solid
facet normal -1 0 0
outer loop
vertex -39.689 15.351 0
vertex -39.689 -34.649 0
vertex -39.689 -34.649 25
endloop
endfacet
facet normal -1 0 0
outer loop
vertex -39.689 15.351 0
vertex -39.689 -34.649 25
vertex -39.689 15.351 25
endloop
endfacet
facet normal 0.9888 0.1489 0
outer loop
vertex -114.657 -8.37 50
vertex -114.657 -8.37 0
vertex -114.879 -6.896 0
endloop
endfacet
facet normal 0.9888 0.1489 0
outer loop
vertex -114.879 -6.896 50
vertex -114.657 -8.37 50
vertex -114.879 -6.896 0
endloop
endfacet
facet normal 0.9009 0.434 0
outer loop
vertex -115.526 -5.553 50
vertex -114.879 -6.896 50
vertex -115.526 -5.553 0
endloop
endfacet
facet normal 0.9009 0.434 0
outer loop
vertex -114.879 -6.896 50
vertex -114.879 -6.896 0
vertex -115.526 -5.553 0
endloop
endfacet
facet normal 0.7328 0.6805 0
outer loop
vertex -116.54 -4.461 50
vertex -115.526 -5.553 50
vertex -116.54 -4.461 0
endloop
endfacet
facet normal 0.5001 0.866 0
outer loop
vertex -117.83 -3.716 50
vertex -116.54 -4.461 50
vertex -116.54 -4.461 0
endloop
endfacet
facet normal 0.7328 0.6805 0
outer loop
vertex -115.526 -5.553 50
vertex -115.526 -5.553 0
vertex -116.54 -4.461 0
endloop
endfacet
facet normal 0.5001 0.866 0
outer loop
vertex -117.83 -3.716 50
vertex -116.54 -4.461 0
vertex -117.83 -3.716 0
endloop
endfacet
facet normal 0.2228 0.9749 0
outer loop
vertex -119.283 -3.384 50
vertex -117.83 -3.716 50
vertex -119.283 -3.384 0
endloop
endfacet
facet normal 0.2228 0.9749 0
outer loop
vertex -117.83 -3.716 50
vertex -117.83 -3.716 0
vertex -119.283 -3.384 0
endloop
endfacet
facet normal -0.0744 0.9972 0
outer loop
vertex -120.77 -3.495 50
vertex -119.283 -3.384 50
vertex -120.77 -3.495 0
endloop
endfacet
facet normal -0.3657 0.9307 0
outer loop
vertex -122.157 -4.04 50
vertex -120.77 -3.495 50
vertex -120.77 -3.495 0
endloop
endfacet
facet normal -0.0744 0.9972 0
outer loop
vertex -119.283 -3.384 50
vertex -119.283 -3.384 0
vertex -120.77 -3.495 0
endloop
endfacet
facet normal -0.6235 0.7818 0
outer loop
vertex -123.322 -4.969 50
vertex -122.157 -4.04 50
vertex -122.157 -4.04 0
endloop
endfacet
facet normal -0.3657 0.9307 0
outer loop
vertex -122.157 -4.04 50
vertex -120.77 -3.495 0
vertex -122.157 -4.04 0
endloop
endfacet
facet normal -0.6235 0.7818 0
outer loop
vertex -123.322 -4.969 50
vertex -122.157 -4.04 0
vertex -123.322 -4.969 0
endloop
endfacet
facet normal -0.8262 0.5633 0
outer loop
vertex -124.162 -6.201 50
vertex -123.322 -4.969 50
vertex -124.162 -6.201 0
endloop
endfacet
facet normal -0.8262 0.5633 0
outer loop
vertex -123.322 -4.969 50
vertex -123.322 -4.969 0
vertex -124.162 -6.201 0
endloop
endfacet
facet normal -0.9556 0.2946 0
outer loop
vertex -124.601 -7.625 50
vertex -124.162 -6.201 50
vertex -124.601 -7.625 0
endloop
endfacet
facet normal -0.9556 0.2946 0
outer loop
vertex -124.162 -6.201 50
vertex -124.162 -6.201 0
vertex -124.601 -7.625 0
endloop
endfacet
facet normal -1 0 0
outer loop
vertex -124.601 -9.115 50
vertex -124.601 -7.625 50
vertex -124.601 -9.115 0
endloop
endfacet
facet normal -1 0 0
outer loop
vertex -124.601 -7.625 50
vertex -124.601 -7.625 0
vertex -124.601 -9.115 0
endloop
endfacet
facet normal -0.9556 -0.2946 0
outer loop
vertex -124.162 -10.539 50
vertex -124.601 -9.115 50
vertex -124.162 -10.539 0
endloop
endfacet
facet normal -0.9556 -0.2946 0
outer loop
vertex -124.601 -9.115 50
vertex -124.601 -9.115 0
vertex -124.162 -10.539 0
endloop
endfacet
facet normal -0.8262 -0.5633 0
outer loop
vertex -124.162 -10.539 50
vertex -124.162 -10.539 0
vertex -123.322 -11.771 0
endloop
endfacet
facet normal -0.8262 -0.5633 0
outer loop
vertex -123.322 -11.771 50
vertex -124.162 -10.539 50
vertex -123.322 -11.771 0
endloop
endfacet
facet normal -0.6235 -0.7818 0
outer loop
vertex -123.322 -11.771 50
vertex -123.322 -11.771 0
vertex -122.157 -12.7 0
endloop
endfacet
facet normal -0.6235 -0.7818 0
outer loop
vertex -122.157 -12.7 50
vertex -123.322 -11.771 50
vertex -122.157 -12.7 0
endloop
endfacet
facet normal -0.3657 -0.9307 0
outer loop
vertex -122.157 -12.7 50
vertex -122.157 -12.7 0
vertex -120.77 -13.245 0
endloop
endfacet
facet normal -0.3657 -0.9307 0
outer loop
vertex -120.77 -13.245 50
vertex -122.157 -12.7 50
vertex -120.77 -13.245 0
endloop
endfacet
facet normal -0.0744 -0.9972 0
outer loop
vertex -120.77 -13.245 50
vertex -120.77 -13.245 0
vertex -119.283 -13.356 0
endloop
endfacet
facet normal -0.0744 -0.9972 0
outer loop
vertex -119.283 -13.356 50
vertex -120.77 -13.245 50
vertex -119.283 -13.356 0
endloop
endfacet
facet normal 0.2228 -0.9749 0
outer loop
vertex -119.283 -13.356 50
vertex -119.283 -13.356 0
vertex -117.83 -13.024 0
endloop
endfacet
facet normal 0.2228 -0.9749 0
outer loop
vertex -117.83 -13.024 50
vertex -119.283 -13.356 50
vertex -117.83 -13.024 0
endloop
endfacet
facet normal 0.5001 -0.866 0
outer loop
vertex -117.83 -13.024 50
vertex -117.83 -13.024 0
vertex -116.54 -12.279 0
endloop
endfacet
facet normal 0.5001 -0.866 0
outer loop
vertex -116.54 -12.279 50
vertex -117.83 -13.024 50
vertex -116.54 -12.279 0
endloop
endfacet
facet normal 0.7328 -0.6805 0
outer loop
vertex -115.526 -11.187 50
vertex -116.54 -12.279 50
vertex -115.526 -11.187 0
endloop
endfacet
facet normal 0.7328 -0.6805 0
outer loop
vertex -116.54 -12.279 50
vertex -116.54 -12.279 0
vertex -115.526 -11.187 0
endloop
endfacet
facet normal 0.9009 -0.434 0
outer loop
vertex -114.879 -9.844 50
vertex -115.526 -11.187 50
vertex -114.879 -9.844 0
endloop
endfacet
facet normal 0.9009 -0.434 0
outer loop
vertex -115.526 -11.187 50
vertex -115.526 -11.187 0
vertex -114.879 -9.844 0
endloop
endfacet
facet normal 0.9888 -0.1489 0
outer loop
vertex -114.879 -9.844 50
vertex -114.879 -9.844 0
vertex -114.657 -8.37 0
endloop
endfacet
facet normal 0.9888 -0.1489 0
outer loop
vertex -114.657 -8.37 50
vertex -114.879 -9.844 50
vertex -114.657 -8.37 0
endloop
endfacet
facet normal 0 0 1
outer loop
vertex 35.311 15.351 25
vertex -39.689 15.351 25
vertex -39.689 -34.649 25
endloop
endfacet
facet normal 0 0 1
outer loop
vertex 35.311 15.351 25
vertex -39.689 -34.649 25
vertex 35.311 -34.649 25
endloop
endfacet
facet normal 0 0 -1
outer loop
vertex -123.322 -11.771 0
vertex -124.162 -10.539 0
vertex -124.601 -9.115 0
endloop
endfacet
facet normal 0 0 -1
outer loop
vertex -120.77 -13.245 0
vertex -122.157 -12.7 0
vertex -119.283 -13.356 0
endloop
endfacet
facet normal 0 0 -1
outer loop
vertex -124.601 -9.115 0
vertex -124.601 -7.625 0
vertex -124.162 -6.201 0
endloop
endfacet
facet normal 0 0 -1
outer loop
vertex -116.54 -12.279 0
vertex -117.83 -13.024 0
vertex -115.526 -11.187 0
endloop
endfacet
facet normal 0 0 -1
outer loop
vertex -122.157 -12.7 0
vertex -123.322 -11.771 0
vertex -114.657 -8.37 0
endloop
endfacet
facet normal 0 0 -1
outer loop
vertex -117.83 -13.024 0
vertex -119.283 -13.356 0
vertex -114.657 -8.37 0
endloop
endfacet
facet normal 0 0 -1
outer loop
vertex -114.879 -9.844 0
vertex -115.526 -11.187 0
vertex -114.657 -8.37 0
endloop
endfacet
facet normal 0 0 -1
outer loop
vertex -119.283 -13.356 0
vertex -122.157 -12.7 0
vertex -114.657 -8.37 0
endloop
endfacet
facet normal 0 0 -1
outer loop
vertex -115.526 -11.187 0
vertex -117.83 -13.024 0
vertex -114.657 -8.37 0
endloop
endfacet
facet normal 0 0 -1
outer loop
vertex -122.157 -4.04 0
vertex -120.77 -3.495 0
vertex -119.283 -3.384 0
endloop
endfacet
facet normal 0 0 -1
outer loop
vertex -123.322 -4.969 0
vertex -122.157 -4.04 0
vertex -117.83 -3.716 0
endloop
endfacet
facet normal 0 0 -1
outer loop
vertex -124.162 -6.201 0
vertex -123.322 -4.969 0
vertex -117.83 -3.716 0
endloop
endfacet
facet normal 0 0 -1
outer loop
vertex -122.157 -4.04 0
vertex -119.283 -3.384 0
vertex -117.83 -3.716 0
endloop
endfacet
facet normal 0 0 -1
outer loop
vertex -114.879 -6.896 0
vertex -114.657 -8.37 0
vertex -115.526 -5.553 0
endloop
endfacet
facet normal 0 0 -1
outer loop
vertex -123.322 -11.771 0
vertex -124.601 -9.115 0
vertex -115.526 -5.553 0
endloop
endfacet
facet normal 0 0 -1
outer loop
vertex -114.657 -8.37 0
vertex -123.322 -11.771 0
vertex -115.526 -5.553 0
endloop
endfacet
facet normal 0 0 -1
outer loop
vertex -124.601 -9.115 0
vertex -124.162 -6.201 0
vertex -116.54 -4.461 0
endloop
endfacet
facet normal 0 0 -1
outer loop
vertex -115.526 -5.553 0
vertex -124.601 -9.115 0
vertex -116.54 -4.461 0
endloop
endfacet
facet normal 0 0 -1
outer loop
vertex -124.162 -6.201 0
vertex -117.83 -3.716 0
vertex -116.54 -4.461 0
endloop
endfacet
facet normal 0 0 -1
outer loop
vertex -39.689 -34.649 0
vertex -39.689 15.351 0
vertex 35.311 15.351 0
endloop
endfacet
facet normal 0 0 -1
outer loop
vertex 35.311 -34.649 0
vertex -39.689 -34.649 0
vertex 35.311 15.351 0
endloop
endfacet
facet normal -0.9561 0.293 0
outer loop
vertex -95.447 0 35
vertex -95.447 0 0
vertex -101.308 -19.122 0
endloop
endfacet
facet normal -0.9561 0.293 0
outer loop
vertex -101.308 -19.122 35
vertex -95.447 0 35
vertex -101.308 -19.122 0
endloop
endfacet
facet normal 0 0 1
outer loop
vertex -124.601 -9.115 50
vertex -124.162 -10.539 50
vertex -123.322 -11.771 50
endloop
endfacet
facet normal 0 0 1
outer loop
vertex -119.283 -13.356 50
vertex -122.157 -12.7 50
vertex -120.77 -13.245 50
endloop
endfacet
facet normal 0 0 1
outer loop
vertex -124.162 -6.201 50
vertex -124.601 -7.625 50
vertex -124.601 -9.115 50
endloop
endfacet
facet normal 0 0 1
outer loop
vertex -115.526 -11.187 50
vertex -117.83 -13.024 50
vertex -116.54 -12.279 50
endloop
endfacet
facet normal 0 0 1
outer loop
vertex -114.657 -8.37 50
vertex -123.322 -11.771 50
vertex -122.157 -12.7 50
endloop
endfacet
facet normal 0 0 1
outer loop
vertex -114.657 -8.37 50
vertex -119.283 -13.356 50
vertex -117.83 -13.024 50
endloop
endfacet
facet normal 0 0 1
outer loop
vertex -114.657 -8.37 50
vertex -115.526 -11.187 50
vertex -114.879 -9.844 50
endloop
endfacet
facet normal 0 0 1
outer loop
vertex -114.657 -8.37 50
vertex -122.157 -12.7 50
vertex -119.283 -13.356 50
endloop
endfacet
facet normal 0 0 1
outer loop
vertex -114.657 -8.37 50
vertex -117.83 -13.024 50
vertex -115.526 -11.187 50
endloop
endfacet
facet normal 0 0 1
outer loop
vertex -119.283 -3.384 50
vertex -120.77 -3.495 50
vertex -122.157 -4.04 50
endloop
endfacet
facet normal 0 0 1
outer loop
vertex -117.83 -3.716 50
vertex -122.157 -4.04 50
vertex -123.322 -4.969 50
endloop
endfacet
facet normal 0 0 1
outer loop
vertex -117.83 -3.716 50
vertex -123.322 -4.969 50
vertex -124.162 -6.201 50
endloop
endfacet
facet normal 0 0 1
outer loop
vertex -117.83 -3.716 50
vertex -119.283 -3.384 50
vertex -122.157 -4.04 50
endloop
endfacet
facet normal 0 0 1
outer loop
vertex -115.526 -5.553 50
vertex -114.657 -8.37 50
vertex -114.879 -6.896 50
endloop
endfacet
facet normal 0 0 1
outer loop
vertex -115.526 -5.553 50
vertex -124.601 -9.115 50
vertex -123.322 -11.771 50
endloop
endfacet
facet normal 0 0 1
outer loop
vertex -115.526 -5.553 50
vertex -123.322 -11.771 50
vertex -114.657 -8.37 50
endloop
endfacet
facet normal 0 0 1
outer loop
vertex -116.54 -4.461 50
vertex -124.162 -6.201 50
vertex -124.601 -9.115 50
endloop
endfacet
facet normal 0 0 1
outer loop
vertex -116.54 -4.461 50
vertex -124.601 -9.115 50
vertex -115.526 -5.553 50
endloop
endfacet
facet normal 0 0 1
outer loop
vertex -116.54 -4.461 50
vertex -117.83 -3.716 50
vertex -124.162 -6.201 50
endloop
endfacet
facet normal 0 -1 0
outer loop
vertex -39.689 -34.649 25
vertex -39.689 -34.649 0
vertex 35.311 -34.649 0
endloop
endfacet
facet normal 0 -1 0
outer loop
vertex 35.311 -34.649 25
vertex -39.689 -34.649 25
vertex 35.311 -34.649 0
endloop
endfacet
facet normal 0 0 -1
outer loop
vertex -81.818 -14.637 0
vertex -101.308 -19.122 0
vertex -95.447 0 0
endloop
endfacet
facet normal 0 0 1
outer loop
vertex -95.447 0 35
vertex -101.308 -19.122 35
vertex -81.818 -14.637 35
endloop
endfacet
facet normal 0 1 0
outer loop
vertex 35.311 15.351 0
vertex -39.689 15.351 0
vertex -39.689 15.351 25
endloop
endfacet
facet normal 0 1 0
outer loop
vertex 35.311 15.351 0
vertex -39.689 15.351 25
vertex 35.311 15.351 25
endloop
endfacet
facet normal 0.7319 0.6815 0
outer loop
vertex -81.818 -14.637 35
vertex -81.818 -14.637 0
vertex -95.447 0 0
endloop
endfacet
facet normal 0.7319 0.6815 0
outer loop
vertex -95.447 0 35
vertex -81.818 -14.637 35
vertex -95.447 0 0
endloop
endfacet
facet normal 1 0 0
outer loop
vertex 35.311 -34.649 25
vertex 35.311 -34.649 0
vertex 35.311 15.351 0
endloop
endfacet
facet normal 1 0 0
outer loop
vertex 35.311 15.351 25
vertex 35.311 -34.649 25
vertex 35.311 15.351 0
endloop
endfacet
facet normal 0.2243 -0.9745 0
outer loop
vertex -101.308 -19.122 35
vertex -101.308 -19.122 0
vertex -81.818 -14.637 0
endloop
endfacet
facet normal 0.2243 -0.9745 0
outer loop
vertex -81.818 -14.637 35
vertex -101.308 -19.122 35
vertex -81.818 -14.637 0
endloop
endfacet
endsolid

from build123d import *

# Parameters (mm, degrees)
F0_W     = 75
F0_H     = 50
F1_DEPTH = 25
F2_R     = 5
F3_DEPTH = 50
F5_DEPTH = 35


with BuildPart() as f1:
    # F0 (on Top) → F1 (new body)
    with BuildSketch(Plane.XY):
        with Locations((-2.189042, -9.649152)):
            Rectangle(F0_W, F0_H)
    extrude(amount=F1_DEPTH)


with BuildPart() as f3:
    # F2 (on Top) → F3 (new body)
    with BuildSketch(Plane.XY):
        with Locations((-119.657114, -8.369925)):
            Circle(F2_R)
    extrude(amount=F3_DEPTH)


with BuildPart() as f5:
    # F4 (on Top) → F5 (new body)
    with BuildSketch(Plane.XY):
        Polygon((-95.447138, 0), (-101.30808, -19.12196), (-81.817506, -14.636705), align=None)
    extrude(amount=F5_DEPTH)


solid = Compound([f1.part, f3.part, f5.part])
